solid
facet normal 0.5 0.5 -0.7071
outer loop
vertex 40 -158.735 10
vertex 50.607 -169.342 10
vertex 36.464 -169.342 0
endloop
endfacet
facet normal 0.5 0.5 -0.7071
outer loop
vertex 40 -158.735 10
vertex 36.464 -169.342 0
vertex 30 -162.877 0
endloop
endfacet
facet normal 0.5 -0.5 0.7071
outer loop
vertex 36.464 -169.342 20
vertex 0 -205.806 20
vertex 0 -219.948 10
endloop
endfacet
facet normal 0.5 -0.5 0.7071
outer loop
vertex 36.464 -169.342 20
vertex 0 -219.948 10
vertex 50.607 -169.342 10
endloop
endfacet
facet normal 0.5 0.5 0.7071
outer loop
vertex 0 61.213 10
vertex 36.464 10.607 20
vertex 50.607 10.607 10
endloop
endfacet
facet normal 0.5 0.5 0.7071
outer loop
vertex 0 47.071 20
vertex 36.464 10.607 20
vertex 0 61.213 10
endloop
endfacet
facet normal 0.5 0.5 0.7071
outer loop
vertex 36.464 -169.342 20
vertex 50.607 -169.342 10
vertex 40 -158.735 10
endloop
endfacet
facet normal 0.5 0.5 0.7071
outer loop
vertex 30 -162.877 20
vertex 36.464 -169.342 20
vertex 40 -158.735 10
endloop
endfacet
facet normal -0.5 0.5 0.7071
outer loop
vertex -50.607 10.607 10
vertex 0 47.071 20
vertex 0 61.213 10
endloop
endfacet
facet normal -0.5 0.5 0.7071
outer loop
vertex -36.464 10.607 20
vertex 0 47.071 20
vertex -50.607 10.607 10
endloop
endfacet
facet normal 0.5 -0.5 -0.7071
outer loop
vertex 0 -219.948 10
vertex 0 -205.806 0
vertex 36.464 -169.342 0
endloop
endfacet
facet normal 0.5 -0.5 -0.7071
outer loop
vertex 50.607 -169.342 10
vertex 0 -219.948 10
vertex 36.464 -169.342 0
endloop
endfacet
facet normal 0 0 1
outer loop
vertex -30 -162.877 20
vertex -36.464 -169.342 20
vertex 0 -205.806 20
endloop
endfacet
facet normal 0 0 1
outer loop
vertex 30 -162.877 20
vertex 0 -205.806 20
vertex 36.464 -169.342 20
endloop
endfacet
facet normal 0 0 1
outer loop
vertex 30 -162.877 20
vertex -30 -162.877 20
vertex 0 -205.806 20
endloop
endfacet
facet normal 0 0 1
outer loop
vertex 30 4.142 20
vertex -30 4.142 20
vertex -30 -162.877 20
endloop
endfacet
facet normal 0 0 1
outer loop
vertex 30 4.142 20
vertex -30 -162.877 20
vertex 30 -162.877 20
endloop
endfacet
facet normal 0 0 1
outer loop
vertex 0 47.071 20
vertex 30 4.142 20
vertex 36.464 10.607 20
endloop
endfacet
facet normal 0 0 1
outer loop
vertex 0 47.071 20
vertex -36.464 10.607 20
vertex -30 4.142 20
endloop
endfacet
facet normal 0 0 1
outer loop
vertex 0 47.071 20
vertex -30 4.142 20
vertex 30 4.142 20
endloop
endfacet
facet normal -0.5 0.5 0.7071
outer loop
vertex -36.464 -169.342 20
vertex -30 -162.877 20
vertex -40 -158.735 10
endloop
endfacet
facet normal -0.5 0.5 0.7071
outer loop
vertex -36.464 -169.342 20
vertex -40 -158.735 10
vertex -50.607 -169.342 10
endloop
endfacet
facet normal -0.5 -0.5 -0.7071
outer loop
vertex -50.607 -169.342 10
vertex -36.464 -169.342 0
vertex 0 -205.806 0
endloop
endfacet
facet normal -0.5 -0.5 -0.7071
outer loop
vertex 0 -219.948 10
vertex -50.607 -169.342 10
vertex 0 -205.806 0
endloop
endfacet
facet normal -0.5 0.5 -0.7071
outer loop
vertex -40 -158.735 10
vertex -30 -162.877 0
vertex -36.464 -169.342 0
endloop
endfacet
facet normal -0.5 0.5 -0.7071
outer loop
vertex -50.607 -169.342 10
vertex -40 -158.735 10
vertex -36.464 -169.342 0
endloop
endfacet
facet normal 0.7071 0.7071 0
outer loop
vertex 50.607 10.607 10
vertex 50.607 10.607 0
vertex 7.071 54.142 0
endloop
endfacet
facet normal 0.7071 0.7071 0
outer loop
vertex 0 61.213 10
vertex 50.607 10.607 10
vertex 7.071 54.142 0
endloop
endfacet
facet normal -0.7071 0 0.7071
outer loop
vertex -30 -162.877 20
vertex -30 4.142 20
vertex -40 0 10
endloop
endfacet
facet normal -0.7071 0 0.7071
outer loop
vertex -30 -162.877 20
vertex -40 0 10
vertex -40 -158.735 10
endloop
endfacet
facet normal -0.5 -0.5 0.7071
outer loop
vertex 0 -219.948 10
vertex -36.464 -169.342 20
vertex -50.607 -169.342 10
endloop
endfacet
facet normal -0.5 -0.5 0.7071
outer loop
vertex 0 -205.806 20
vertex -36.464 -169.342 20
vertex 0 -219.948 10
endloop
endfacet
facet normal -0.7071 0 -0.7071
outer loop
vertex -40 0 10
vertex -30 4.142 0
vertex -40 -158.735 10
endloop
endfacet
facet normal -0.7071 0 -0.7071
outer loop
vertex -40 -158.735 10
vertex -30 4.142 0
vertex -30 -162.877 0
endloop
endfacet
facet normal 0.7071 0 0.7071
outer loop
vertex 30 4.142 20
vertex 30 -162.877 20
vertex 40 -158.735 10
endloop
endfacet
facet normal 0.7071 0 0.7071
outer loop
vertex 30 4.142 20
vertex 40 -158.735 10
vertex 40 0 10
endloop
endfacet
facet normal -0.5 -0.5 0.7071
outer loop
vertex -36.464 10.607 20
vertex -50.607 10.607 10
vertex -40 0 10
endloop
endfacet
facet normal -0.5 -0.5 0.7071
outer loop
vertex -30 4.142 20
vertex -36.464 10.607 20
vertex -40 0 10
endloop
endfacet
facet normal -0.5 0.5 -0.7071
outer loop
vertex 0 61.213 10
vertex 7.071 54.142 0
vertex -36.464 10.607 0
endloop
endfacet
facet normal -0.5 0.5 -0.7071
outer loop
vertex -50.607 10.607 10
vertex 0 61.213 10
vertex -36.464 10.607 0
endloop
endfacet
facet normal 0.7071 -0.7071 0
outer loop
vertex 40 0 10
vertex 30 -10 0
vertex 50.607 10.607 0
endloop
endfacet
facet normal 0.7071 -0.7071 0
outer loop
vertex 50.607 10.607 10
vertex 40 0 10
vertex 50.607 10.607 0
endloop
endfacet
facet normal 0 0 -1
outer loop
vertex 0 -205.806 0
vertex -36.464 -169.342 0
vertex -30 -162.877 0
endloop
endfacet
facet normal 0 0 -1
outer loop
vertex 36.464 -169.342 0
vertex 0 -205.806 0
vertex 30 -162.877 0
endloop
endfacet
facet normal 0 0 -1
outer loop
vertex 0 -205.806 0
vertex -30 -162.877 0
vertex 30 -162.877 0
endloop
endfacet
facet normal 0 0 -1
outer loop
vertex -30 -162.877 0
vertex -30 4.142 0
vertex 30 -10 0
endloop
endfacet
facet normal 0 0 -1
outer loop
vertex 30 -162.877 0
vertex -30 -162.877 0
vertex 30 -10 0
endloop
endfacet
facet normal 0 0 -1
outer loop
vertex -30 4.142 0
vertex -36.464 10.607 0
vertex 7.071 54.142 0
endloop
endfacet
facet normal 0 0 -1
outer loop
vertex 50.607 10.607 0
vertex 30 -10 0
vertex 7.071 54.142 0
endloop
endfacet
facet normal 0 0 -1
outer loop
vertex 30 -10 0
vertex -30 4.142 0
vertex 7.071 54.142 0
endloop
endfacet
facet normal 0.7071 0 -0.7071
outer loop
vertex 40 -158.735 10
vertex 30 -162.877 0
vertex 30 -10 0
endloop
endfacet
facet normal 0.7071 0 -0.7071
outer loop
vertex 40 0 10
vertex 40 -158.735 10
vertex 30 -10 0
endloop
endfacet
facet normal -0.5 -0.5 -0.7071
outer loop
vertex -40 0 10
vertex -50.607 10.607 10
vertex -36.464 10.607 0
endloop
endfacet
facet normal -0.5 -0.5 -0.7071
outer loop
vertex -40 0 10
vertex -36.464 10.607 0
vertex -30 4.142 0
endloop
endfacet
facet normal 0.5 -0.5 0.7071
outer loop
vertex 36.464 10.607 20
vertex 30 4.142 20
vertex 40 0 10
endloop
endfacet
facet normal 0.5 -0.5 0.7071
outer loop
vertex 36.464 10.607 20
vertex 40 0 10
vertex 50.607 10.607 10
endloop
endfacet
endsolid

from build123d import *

# Parameters (mm, degrees)
F1_DEPTH = 20
F2_SIZE2 = 9.99999
F2_SIZE  = 9.99999


# Not quite as in the source:
# - a fillet or chamfer is up to 0.001 mm smaller than in the source, because OpenCascade refuses the exact size


with BuildPart() as f1:
    # F0 (on Top) → F1 (new body)
    with BuildSketch(Plane.XY):
        Polygon((-50.6066017178, 10.6066017178), (-40, 0), (-40, -79.367487377), (40, -79.367487377), (40, 0), (50.6066017178, 10.6066017178), (0, 61.2132034356), align=None)
        Polygon((40, -79.367487377), (-40, -79.367487377), (-40, -158.7349747541), (-50.6066017178, -169.3415764719), (0, -219.9481781897), (50.6066017178, -169.3415764719), (40, -158.7349747541), align=None)
    extrude(amount=F1_DEPTH)

    # F2 (size 10 and 10 in the source; OpenCascade refuses exactly that, so slightly less here)
    f2_edges = [f1.edges().sort_by_distance(p)[0] for p in [
        (40, -79.367487, 20),
        (25.303301, 35.909903, 20),
        (-25.303301, 35.909903, 20),
        (-45.303301, 5.303301, 20),
        (45.303301, 5.303301, 20),
        (-40, -79.367487, 20),
        (-45.303301, -164.038276, 20),
        (-25.303301, -194.644877, 20),
        (25.303301, -194.644877, 20),
        (45.303301, -164.038276, 20),
        (40, -79.367487, 0),
        (25.303301, -194.644877, 0),
        (45.303301, -164.038276, 0),
        (-25.303301, -194.644877, 0),
        (-45.303301, -164.038276, 0),
        (-40, -79.367487, 0),
        (-45.303301, 5.303301, 0),
        (-25.303301, 35.909903, 0),
    ]]
    chamfer(f2_edges, length=F2_SIZE, length2=F2_SIZE2)


solid = f1.part
